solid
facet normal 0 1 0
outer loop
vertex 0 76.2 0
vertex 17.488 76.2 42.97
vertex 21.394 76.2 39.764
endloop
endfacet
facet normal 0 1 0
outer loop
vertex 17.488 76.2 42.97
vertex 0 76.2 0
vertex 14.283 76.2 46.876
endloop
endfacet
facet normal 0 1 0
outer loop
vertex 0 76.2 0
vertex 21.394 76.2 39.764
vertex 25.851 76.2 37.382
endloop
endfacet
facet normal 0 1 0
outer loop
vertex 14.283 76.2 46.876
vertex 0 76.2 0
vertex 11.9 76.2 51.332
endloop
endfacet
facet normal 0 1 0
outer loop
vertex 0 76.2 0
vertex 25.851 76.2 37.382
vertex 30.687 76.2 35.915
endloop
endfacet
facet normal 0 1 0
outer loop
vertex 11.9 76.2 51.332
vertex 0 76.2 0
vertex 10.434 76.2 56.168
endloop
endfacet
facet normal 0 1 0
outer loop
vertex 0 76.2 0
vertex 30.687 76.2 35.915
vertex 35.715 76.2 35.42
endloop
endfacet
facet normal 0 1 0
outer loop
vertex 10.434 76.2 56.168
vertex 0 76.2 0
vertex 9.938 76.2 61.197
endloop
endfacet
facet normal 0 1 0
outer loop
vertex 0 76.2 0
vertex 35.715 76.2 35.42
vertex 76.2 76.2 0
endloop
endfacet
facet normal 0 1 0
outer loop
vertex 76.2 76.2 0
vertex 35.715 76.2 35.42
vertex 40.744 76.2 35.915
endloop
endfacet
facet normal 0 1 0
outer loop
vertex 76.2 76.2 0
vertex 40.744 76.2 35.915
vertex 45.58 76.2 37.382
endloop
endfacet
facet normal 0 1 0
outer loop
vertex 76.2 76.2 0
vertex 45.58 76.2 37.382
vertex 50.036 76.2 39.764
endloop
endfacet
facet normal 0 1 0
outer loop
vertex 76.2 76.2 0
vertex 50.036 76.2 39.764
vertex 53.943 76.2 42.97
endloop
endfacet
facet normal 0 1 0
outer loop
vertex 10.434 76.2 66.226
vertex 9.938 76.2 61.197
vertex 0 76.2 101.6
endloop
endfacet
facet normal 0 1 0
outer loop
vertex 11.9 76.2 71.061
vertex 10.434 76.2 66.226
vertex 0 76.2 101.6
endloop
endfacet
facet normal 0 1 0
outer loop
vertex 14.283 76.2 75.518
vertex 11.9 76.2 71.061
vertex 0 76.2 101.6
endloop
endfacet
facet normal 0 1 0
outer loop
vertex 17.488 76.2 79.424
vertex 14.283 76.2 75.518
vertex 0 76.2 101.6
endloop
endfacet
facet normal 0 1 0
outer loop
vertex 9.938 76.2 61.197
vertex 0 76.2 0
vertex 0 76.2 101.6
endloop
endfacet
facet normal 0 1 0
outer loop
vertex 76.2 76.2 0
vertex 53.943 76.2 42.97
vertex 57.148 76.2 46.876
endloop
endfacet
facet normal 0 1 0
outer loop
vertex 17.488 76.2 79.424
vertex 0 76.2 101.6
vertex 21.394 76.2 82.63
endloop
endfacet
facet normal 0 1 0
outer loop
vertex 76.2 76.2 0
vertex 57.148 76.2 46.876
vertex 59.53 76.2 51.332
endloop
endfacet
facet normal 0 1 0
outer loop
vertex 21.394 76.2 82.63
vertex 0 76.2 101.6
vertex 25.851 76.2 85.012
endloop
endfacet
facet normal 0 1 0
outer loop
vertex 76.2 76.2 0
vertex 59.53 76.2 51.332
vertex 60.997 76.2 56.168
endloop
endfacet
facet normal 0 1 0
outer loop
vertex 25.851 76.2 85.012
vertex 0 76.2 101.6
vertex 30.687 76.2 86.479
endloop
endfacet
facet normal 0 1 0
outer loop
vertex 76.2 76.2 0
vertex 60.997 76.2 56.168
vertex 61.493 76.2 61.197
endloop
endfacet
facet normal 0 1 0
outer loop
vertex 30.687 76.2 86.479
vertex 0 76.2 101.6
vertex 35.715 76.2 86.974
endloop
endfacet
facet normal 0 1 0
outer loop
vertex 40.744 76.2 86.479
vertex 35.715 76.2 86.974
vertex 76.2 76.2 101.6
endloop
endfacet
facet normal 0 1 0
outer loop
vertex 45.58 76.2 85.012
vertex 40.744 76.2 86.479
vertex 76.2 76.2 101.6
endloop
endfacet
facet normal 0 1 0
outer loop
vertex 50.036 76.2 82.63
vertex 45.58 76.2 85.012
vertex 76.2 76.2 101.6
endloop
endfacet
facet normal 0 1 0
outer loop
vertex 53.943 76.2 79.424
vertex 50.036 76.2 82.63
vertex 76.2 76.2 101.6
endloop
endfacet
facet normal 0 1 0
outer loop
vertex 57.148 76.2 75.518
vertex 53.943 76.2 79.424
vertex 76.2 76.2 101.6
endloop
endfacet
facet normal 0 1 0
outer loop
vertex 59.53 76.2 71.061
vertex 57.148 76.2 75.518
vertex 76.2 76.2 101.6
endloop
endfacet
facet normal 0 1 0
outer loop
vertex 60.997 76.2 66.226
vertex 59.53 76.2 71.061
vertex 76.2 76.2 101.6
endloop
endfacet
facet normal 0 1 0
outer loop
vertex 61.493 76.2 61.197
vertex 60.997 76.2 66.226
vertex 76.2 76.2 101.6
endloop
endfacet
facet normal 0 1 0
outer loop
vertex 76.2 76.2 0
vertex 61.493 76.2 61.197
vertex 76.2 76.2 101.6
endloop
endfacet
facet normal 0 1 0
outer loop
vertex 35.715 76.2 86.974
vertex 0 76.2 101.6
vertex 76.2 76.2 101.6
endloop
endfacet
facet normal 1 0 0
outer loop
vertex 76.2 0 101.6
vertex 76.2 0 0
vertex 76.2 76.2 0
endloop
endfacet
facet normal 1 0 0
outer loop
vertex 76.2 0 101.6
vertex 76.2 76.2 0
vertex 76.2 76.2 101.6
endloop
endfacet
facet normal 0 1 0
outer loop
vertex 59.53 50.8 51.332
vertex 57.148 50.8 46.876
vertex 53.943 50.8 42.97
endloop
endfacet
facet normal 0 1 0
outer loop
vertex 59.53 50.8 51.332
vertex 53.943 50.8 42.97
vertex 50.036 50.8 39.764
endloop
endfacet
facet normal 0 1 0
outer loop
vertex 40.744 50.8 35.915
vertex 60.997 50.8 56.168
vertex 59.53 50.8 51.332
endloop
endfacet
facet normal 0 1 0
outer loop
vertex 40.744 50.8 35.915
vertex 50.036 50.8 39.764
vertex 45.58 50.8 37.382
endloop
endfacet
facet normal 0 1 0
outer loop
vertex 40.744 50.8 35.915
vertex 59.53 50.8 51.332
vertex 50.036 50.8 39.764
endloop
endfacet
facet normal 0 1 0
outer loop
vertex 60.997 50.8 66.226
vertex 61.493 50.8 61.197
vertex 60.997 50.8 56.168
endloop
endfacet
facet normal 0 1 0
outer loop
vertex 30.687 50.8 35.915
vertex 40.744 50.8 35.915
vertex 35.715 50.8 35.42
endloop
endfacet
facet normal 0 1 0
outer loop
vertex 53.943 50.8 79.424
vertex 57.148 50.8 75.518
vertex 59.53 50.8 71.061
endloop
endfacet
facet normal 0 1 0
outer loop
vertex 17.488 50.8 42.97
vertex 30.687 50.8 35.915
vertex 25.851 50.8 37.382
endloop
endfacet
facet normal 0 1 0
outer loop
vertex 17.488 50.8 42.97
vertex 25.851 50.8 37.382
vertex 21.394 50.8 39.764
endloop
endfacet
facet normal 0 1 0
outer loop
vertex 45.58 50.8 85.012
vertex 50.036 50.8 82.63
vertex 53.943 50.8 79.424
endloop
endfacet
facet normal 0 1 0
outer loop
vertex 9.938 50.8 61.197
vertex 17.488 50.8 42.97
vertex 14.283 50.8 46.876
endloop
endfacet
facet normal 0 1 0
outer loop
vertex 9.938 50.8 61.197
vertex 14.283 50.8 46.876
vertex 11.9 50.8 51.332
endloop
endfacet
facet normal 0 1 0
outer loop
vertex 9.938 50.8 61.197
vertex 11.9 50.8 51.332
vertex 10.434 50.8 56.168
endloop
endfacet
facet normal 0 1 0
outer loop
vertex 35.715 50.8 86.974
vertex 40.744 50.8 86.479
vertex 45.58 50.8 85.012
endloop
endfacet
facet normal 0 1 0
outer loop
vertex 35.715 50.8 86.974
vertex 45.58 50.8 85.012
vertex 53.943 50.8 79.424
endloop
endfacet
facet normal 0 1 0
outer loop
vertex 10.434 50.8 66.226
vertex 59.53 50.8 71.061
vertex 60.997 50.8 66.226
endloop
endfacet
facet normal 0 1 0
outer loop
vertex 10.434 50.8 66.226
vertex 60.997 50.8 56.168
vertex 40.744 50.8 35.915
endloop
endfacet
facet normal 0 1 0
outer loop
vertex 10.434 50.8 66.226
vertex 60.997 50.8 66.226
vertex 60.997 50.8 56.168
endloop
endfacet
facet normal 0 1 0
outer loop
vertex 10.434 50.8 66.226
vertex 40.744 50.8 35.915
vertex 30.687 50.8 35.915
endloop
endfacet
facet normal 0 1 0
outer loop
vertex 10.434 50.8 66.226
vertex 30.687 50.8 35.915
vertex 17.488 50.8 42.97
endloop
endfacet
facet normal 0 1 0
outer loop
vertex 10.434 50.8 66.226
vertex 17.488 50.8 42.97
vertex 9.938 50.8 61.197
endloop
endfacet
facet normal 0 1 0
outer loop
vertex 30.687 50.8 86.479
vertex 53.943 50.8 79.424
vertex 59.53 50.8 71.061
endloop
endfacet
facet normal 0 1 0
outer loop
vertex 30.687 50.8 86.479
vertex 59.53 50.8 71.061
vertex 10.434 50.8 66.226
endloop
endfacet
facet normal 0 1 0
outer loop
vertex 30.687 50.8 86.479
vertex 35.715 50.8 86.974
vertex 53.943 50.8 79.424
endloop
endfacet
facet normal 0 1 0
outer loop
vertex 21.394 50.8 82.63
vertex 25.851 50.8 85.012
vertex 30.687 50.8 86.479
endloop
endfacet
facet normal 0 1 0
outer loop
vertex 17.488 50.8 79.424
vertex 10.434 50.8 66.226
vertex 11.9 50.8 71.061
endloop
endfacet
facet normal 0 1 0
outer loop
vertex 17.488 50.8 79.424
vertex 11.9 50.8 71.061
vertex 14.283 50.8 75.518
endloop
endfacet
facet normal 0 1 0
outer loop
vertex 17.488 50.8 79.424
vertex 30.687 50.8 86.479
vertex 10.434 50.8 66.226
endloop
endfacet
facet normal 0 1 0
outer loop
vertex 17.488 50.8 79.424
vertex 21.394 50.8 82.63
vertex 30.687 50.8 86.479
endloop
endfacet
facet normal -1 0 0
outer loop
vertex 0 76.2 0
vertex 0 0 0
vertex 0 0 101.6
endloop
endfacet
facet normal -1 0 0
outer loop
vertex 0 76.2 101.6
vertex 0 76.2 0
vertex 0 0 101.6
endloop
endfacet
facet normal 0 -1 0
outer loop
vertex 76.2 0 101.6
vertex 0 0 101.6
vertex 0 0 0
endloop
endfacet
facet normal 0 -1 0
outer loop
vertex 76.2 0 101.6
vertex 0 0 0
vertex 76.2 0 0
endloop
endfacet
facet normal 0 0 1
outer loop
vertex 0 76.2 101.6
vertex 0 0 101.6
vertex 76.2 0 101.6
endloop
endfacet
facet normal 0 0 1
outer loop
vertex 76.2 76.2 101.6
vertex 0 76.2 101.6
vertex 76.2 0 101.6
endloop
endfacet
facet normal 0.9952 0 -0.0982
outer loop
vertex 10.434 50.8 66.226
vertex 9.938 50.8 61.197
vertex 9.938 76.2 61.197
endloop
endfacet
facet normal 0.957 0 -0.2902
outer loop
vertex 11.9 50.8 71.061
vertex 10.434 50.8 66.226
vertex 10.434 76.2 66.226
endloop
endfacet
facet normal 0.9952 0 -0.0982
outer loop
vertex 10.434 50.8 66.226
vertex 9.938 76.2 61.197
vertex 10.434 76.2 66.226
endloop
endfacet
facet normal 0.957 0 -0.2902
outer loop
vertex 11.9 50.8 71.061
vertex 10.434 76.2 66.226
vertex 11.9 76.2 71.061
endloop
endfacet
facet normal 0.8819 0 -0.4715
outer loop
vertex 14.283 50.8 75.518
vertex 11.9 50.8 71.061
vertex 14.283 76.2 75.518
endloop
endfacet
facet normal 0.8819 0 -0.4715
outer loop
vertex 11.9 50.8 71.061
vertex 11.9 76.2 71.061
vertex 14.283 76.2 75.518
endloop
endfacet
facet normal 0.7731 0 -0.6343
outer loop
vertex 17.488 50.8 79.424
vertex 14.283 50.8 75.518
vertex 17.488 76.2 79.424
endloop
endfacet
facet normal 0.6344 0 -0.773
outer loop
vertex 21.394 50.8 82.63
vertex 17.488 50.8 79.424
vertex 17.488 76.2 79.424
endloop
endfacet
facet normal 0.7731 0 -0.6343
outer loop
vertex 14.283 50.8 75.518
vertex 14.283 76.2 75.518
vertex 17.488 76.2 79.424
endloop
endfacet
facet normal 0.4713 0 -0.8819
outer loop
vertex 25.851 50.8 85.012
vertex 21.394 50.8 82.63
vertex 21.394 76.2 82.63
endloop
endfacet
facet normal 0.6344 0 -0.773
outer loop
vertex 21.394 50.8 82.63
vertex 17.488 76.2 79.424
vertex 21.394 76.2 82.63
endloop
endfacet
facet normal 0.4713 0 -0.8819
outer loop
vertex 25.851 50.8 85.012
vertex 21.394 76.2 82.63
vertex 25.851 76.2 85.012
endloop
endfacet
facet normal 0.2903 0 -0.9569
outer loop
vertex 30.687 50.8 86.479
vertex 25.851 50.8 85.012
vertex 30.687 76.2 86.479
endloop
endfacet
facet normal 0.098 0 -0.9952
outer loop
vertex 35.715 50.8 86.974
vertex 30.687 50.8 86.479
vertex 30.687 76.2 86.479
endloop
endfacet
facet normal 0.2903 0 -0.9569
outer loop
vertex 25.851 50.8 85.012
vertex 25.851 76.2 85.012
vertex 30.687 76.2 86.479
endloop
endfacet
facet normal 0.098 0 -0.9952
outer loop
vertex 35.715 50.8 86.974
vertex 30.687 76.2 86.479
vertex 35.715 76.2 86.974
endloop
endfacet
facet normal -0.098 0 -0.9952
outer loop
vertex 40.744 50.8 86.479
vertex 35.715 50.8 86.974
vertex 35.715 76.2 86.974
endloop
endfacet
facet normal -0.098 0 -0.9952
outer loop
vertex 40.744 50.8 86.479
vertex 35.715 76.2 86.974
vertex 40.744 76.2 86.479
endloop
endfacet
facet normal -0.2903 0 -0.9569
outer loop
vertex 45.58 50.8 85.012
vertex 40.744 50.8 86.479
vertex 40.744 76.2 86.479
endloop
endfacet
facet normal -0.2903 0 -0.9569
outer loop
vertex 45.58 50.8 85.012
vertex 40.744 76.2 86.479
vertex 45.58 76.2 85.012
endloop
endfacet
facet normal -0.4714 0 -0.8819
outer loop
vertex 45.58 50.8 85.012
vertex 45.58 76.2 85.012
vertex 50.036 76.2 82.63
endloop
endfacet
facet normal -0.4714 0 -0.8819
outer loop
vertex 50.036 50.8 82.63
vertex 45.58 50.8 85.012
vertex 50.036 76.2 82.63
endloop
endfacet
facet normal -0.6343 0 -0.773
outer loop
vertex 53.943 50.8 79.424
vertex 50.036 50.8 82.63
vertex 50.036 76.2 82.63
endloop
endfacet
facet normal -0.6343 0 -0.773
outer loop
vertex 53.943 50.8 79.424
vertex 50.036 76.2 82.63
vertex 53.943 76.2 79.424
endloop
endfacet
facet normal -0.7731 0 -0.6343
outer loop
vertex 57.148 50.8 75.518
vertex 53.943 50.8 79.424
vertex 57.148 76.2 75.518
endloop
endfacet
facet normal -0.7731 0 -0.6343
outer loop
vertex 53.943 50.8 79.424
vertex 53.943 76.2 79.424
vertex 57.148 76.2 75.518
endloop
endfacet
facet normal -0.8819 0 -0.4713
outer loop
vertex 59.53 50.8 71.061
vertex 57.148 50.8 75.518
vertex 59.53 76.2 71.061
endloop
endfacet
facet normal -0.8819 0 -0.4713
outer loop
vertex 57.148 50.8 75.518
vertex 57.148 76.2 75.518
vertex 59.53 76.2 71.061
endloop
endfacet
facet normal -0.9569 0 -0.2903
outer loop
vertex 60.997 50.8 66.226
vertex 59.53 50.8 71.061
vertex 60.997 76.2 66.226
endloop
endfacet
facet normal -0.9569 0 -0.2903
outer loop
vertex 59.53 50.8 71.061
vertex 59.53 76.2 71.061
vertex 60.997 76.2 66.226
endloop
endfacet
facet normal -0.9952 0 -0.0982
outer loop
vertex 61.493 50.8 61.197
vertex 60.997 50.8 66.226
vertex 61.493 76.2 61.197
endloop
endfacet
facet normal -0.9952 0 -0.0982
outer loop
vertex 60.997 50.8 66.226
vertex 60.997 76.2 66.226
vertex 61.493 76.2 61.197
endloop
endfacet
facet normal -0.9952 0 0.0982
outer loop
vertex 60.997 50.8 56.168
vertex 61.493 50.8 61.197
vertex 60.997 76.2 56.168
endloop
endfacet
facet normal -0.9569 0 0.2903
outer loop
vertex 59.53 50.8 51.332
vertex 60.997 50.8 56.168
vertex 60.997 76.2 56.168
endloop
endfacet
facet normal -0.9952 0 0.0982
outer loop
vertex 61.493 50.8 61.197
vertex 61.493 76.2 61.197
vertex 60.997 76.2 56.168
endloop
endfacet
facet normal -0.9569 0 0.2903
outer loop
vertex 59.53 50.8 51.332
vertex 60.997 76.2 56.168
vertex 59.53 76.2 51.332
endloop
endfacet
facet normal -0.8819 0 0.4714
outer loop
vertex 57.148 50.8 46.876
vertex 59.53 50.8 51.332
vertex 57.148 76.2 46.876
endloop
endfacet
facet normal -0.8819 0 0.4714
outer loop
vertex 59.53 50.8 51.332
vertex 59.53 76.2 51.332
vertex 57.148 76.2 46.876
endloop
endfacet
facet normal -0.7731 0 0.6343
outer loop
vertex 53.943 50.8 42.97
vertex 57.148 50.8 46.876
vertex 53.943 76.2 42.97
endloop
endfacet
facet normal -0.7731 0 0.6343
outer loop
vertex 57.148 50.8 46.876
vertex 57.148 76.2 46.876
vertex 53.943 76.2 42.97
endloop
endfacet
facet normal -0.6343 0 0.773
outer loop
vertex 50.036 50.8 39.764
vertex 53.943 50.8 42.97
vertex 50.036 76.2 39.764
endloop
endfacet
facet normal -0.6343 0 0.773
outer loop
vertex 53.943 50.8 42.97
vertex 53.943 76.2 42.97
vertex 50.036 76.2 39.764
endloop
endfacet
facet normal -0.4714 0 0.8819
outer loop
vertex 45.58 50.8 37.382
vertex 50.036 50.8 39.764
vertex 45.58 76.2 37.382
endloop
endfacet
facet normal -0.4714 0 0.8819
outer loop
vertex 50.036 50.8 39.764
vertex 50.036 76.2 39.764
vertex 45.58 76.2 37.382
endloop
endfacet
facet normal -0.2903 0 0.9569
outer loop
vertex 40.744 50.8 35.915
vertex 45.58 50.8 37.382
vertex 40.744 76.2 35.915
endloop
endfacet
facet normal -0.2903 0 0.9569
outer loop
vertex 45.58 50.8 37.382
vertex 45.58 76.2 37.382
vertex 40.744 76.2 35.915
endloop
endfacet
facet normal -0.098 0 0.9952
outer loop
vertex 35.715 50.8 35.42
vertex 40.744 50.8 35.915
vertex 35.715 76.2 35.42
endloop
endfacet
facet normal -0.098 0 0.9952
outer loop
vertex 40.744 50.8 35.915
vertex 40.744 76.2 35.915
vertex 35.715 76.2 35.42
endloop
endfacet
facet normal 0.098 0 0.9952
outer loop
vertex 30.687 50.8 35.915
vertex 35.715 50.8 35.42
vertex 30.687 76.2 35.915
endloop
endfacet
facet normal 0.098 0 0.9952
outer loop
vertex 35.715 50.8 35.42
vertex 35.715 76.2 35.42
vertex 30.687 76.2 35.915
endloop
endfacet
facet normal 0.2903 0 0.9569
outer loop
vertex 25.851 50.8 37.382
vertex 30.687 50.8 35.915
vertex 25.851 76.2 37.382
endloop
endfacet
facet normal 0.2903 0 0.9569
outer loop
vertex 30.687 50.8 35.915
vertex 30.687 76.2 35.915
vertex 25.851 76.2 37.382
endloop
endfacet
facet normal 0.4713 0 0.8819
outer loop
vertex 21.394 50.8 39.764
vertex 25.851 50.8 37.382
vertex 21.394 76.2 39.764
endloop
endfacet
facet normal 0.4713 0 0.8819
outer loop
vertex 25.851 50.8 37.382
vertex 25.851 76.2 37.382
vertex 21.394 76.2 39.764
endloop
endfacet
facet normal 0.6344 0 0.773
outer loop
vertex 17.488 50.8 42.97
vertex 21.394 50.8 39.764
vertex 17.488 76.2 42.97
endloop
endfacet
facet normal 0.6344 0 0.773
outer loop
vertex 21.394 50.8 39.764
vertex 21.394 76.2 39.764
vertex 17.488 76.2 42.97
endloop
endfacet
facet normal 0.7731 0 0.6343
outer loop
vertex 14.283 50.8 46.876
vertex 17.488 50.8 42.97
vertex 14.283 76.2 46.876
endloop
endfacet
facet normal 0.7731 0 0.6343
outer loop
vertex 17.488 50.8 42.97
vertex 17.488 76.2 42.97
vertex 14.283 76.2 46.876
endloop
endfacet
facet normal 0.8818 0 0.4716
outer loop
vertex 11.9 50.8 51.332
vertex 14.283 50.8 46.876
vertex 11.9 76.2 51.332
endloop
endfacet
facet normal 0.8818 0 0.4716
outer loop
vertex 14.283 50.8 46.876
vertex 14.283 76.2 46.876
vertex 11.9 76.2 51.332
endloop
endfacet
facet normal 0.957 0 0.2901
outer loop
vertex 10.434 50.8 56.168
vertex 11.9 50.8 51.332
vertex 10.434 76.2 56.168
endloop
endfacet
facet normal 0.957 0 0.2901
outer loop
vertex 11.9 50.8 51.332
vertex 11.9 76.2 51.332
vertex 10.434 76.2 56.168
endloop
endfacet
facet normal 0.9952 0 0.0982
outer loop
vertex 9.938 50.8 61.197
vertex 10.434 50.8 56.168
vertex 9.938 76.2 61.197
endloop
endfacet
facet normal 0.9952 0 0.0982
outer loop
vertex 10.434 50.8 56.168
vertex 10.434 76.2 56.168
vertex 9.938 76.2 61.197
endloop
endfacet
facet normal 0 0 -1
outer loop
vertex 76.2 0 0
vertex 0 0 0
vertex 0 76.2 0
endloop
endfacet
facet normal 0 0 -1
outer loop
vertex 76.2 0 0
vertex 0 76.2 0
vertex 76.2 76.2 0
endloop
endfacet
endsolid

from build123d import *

# Parameters (mm, degrees)
F0_W     = 76.2
F0_H     = 101.6
F1_DEPTH = 76.2
F2_R     = 25.777138
F3_DEPTH = 25.4


with BuildPart() as f1:
    # F0 (on Front) → F1 (new body)
    with BuildSketch(Plane.XZ):
        with Locations((38.1, 50.8)):
            Rectangle(F0_W, F0_H)
    extrude(amount=-F1_DEPTH)

    # F2 (on face) → F3 (cut)
    with BuildSketch(Plane(origin=(0, 76.2, 0), x_dir=(-1, 0, 0), z_dir=(0, 1, 0))):
        with Locations((-35.715438, 61.196949)):
            Circle(F2_R)
    extrude(amount=-F3_DEPTH, mode=Mode.SUBTRACT)


solid = f1.part
